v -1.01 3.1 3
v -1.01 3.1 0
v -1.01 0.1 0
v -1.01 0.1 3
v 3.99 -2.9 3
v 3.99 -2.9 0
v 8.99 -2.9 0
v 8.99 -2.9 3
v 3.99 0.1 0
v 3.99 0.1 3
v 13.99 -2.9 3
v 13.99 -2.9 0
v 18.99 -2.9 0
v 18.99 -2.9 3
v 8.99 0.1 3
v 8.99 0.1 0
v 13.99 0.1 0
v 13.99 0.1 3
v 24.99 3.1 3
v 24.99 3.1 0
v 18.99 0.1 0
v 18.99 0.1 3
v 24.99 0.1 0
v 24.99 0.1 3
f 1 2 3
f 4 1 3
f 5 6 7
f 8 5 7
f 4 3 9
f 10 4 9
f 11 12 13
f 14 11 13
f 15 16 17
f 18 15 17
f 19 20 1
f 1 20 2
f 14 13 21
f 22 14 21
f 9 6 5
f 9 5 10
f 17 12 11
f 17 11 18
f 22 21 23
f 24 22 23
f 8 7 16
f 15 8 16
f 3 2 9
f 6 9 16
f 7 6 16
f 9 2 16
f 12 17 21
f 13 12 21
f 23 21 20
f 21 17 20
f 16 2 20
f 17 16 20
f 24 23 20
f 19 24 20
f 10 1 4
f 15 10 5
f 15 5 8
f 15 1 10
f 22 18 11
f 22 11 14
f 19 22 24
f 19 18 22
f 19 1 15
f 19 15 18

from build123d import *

# Parameters (mm, degrees)
ESQUISSE1_W        = 5
ESQUISSE1_H        = 3
BOSS_EXTRU_1_DEPTH = 3


with BuildPart() as part:
    # Esquisse1 → Boss.-Extru.1 (new body)
    with BuildSketch(Plane.XY):
        with Locations((6.490106642, -1.399569673)):
            Rectangle(ESQUISSE1_W, ESQUISSE1_H)
        with Locations((16.490106642, -1.399569673)):
            Rectangle(ESQUISSE1_W, ESQUISSE1_H)
        Polygon((-1.009893358, 0.100430327), (3.990106642, 0.100430327), (8.990106642, 0.100430327), (13.990106642, 0.100430327), (18.990106642, 0.100430327), (24.990106642, 0.100430327), (24.990106642, 3.100430327), (-1.009893358, 3.100430327), align=None)
    extrude(amount=BOSS_EXTRU_1_DEPTH)


solid = part.part
